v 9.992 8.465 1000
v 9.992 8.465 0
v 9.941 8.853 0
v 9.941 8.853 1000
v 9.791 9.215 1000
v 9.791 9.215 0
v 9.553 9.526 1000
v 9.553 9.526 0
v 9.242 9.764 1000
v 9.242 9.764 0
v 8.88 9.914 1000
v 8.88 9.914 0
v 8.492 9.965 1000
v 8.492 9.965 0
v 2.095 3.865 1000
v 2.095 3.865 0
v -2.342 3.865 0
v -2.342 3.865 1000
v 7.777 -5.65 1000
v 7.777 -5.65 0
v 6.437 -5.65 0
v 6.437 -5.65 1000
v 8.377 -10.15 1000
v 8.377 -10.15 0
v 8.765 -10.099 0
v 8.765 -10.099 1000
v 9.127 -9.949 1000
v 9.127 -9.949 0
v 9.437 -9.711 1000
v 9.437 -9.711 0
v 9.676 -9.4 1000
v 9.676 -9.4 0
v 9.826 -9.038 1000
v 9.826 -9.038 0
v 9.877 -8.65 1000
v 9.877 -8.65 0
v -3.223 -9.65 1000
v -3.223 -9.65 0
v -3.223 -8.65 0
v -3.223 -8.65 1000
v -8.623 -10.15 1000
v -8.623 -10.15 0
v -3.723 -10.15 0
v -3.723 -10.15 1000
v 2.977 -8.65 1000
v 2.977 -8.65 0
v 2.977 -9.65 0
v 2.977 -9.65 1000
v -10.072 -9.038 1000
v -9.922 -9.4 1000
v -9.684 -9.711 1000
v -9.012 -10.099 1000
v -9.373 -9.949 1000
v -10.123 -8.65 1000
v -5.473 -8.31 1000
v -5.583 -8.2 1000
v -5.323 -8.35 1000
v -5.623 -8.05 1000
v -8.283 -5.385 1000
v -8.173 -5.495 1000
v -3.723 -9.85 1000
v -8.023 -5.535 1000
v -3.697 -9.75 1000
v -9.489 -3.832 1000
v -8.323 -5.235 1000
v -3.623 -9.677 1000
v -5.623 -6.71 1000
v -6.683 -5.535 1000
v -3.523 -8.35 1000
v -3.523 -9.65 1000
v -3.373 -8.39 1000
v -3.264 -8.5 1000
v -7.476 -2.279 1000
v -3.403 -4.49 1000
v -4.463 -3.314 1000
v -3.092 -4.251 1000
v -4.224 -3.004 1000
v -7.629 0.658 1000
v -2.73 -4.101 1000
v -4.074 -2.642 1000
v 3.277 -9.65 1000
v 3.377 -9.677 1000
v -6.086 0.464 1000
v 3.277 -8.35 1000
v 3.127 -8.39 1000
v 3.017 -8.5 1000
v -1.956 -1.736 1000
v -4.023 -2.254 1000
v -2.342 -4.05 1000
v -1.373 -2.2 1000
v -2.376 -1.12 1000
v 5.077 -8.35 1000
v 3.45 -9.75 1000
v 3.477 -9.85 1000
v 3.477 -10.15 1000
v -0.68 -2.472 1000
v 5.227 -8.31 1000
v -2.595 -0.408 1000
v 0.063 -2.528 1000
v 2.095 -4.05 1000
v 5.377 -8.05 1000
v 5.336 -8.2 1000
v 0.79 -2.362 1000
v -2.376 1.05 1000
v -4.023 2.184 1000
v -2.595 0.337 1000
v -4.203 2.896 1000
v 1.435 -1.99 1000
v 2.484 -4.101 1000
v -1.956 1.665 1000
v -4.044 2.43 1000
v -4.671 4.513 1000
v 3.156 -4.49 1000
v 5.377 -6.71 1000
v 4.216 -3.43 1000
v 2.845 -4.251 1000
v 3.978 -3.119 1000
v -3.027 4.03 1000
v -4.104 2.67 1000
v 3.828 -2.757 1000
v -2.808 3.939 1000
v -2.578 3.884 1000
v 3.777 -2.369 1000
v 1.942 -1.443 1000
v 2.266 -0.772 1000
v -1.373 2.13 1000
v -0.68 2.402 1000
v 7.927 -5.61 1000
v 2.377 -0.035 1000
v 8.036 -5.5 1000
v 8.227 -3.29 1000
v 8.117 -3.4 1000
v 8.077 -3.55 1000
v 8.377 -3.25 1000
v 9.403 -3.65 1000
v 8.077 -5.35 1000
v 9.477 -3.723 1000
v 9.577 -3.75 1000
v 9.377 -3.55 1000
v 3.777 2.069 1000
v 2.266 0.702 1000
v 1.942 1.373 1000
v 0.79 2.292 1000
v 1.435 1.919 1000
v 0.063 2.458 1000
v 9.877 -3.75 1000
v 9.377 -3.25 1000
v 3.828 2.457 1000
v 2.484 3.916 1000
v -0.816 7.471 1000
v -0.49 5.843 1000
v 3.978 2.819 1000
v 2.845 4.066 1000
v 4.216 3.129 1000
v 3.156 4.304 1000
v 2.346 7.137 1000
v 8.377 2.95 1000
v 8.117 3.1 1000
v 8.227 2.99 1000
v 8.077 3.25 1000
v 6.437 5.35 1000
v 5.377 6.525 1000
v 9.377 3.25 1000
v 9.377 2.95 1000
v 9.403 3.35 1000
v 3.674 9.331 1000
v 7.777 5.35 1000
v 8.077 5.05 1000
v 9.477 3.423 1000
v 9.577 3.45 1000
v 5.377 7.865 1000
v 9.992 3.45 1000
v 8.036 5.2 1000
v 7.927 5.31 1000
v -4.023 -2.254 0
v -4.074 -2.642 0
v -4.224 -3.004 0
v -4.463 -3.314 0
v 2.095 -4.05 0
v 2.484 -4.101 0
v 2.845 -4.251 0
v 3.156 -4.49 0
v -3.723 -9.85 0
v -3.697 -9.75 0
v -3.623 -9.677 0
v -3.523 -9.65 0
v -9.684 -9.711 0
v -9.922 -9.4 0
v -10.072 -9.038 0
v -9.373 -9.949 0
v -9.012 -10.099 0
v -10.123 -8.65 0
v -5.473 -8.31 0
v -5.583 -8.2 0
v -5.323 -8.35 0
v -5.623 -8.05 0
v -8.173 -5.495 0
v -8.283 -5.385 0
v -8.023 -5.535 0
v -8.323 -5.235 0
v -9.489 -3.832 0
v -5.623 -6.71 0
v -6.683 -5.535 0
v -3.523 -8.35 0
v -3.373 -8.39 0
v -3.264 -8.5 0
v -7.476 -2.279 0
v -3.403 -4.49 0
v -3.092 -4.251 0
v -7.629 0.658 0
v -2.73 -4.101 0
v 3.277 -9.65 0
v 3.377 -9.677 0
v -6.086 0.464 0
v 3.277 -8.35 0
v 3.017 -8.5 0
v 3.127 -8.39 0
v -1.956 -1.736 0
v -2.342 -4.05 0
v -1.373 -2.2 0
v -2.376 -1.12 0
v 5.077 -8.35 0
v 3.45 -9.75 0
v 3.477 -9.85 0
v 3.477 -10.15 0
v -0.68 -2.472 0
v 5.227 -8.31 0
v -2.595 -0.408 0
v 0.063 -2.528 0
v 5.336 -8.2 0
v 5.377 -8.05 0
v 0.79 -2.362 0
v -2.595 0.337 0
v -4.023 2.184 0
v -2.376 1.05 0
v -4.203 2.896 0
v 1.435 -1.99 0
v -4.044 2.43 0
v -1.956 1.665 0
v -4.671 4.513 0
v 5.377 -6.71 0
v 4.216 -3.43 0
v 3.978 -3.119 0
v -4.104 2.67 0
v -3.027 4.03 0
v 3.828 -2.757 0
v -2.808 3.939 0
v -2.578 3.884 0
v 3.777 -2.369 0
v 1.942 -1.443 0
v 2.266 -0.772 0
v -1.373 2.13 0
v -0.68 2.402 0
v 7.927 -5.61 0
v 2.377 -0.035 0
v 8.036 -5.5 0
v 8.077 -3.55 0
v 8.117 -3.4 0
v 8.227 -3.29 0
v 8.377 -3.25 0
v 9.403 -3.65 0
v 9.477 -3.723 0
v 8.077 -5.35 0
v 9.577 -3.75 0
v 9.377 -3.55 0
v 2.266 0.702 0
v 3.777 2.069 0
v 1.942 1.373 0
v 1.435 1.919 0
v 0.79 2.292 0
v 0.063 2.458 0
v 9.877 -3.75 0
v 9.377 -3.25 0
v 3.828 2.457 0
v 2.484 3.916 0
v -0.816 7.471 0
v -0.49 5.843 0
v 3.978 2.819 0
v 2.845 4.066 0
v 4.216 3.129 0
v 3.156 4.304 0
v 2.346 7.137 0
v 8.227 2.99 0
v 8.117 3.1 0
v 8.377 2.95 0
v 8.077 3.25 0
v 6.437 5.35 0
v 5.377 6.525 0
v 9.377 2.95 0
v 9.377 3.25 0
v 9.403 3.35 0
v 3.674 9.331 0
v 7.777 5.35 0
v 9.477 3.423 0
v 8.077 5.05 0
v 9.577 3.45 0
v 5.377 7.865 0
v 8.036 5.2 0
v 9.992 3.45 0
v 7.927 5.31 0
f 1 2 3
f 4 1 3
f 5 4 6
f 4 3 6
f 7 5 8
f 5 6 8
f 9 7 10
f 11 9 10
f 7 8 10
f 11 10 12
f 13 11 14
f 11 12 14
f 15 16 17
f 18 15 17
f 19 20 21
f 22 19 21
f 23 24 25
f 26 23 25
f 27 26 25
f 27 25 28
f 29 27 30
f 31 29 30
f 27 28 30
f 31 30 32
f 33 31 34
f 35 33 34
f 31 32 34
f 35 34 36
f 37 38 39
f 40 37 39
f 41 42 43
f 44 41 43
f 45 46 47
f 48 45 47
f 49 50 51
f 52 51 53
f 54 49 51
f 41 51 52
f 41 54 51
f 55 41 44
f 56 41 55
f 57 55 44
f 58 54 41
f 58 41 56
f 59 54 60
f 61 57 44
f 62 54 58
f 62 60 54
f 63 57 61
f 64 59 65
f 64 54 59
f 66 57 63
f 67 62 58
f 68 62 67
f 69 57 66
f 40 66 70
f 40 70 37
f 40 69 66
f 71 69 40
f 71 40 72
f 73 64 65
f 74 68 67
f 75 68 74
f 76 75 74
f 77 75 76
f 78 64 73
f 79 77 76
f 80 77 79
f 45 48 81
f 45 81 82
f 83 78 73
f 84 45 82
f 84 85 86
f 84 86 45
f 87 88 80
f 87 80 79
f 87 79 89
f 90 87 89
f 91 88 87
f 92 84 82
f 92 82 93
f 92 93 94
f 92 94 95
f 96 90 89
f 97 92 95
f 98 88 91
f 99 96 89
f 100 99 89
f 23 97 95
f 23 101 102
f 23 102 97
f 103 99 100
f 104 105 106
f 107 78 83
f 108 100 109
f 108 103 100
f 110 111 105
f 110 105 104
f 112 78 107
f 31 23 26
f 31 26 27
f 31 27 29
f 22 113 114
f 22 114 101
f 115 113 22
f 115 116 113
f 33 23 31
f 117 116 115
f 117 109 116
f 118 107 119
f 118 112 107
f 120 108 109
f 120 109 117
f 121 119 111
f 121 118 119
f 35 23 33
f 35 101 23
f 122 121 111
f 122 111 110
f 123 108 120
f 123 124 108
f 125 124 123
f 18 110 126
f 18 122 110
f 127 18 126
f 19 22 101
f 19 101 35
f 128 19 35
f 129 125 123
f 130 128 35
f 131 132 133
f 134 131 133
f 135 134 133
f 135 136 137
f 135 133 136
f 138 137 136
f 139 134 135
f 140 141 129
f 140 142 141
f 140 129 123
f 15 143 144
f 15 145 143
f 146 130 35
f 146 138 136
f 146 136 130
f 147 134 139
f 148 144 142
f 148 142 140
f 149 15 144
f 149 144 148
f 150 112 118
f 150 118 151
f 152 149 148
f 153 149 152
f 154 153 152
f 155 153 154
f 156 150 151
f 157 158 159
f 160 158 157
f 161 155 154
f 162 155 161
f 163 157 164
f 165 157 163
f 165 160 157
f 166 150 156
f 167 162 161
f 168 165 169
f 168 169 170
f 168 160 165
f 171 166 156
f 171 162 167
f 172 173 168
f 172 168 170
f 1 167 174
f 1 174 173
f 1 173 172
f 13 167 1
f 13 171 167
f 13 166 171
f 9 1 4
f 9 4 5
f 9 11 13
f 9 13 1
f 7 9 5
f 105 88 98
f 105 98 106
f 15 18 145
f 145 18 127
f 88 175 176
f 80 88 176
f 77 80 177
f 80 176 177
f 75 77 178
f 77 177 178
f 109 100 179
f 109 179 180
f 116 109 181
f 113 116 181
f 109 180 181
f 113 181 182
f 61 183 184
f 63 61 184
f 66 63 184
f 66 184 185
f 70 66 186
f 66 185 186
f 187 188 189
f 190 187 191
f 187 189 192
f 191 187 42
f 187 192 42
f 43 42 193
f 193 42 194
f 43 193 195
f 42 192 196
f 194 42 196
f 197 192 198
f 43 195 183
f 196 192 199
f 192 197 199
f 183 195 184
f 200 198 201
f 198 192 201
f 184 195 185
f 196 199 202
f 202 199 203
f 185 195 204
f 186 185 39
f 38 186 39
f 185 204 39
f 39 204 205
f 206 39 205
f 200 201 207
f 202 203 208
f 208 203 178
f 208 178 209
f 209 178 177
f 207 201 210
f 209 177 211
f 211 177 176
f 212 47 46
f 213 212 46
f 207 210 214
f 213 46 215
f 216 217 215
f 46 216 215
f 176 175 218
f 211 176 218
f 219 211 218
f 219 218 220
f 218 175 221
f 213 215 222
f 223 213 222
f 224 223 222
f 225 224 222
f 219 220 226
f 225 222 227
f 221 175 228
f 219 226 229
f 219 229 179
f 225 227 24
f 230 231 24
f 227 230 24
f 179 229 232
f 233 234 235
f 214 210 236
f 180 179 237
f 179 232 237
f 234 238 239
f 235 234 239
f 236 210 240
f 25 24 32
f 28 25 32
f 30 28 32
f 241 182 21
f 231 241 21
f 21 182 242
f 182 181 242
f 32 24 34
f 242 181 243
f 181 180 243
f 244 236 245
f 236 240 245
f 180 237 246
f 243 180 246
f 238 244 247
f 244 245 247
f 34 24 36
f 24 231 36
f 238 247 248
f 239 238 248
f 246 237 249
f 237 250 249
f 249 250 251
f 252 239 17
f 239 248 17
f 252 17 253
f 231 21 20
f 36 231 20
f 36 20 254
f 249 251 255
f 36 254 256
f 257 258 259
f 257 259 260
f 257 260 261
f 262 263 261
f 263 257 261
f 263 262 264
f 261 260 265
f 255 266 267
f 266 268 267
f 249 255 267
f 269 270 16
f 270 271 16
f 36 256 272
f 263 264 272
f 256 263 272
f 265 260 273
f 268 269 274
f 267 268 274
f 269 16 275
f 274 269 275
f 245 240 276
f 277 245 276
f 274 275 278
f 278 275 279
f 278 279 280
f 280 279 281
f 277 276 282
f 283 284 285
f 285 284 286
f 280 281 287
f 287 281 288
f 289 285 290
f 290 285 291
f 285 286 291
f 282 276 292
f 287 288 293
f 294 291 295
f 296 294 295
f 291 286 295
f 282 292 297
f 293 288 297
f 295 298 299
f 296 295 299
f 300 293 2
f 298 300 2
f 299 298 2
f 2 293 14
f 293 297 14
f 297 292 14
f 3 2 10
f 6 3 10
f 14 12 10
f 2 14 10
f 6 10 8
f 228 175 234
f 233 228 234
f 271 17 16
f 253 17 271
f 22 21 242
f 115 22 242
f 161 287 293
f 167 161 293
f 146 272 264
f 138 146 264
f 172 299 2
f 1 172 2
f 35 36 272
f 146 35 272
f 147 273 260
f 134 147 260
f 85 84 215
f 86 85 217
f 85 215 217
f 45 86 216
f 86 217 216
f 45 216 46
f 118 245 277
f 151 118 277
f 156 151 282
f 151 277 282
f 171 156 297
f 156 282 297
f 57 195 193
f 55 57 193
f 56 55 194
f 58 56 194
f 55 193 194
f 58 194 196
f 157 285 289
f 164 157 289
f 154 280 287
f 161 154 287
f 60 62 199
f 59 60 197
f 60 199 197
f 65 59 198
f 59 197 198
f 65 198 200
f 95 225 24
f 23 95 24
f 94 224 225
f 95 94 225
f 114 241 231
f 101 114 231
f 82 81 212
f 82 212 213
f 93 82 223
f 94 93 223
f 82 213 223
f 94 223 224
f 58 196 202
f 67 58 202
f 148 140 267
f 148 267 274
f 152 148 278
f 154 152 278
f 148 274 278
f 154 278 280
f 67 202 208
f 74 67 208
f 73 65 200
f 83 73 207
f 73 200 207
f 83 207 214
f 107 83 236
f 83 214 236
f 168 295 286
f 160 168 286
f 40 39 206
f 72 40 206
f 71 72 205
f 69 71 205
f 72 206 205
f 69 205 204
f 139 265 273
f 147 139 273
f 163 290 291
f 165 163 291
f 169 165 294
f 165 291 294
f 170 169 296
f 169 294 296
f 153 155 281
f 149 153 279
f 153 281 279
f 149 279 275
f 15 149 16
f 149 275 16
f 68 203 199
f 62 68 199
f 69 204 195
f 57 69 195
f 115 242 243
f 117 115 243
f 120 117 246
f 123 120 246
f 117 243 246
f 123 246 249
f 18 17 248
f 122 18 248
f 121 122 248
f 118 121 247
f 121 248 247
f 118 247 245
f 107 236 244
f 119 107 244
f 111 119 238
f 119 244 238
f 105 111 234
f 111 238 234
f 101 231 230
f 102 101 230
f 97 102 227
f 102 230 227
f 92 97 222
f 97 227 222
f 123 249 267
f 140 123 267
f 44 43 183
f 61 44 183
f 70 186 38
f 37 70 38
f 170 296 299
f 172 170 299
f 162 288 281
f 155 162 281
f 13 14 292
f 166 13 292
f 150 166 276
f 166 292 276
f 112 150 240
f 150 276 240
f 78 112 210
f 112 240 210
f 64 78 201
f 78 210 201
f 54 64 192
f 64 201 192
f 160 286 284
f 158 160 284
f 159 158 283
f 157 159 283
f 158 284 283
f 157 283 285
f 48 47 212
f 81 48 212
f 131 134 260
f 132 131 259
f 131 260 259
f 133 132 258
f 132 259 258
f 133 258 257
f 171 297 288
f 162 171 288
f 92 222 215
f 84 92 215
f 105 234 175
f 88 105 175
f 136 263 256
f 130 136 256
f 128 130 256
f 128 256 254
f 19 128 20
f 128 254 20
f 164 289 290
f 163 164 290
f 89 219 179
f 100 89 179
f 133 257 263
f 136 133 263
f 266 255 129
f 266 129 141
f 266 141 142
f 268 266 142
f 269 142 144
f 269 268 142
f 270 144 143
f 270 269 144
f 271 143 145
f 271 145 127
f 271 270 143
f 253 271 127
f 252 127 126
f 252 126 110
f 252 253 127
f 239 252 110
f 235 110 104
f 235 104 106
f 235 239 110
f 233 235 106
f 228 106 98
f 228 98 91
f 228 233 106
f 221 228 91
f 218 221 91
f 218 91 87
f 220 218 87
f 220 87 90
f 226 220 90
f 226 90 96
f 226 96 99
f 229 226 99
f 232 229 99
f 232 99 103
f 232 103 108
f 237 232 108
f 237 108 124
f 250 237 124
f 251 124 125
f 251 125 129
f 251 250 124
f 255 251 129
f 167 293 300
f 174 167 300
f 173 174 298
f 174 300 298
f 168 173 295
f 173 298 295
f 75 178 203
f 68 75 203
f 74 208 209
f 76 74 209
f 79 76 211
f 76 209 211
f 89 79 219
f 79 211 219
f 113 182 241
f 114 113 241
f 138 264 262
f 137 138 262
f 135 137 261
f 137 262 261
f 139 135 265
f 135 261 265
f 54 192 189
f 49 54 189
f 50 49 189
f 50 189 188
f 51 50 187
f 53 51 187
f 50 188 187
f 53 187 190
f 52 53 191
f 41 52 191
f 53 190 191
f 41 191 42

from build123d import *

# Parameters (mm, degrees)
SKETCH_1_R      = 2.5
EXTRUDE_1_DEPTH = 1000


with BuildPart() as part:
    # 草图1 → 凸台-拉伸1 (new body)
    with BuildSketch(Plane.XY):
        with BuildLine():
            Line((4.215995631, 3.129161171), (6.436655803, 5.349821343))
            Line((6.436655803, 5.349821343), (7.776655803, 5.349821343))
            ThreePointArc((7.776655803, 5.349821343), (7.988787838, 5.261953377), (8.076655803, 5.049821343))
            Line((8.076655803, 5.049821343), (8.076655803, 3.249821343))
            ThreePointArc((8.076655803, 3.249821343), (8.164523769, 3.037689308), (8.376655803, 2.949821343))
            Line((8.376655803, 2.949821343), (9.376655803, 2.949821343))
            Line((9.376655803, 2.949821343), (9.376655803, 3.249821343))
            ThreePointArc((9.376655803, 3.249821343), (9.435234447, 3.391242699), (9.576655803, 3.449821343))
            Line((9.576655803, 3.449821343), (9.99208048, 3.449821343))
            Line((9.99208048, 3.449821343), (9.99208048, 8.46524602))
            ThreePointArc((9.99208048, 8.46524602), (9.552740652, 9.525906191), (8.49208048, 9.96524602))
            ThreePointArc((8.49208048, 9.96524602), (-4.671012544, 4.512914366), (-10.123344197, -8.650178657))
            ThreePointArc((-10.123344197, -8.650178657), (-9.684004369, -9.710838829), (-8.623344197, -10.150178657))
            Line((-8.623344197, -10.150178657), (-3.723344197, -10.150178657))
            Line((-3.723344197, -10.150178657), (-3.723344197, -9.850178657))
            ThreePointArc((-3.723344197, -9.850178657), (-3.664765553, -9.708757301), (-3.523344197, -9.650178657))
            Line((-3.523344197, -9.650178657), (-3.223344197, -9.650178657))
            Line((-3.223344197, -9.650178657), (-3.223344197, -8.650178657))
            ThreePointArc((-3.223344197, -8.650178657), (-3.311212162, -8.438046623), (-3.523344197, -8.350178657))
            Line((-3.523344197, -8.350178657), (-5.323344197, -8.350178657))
            ThreePointArc((-5.323344197, -8.350178657), (-5.535476231, -8.262310692), (-5.623344197, -8.050178657))
            Line((-5.623344197, -8.050178657), (-5.623344197, -6.710178657))
            Line((-5.623344197, -6.710178657), (-3.402684025, -4.489518485))
            ThreePointArc((-3.402684025, -4.489518485), (-2.916049002, -4.164359358), (-2.342023853, -4.050178657))
            Line((-2.342023853, -4.050178657), (2.09533546, -4.050178657))
            ThreePointArc((2.09533546, -4.050178657), (2.669360608, -4.164359358), (3.155995631, -4.489518485))
            Line((3.155995631, -4.489518485), (5.376655803, -6.710178657))
            Line((5.376655803, -6.710178657), (5.376655803, -8.050178657))
            ThreePointArc((5.376655803, -8.050178657), (5.288787838, -8.262310692), (5.076655803, -8.350178657))
            Line((5.076655803, -8.350178657), (3.276655803, -8.350178657))
            ThreePointArc((3.276655803, -8.350178657), (3.064523769, -8.438046623), (2.976655803, -8.650178657))
            Line((2.976655803, -8.650178657), (2.976655803, -9.650178657))
            Line((2.976655803, -9.650178657), (3.276655803, -9.650178657))
            ThreePointArc((3.276655803, -9.650178657), (3.418077159, -9.708757301), (3.476655803, -9.850178657))
            Line((3.476655803, -9.850178657), (3.476655803, -10.150178657))
            Line((3.476655803, -10.150178657), (8.376655803, -10.150178657))
            ThreePointArc((8.376655803, -10.150178657), (9.437315975, -9.710838829), (9.876655803, -8.650178657))
            Line((9.876655803, -8.650178657), (9.876655803, -3.750178657))
            Line((9.876655803, -3.750178657), (9.576655803, -3.750178657))
            ThreePointArc((9.576655803, -3.750178657), (9.435234447, -3.691600013), (9.376655803, -3.550178657))
            Line((9.376655803, -3.550178657), (9.376655803, -3.250178657))
            Line((9.376655803, -3.250178657), (8.376655803, -3.250178657))
            ThreePointArc((8.376655803, -3.250178657), (8.164523769, -3.338046623), (8.076655803, -3.550178657))
            Line((8.076655803, -3.550178657), (8.076655803, -5.350178657))
            ThreePointArc((8.076655803, -5.350178657), (7.988787838, -5.562310692), (7.776655803, -5.650178657))
            Line((7.776655803, -5.650178657), (6.436655803, -5.650178657))
            Line((6.436655803, -5.650178657), (4.215995631, -3.429518485))
            ThreePointArc((4.215995631, -3.429518485), (3.890836504, -2.942883462), (3.776655803, -2.368858314))
            Line((3.776655803, -2.368858314), (3.776655803, 2.068500999))
            ThreePointArc((3.776655803, 2.068500999), (3.890836504, 2.642526148), (4.215995631, 3.129161171))
        make_face()
        with Locations((-0.123344197, -0.035109627)):
            Circle(SKETCH_1_R, mode=Mode.SUBTRACT)
        with BuildLine():
            Line((5.376655803, 7.864890373), (5.376655803, 6.524890373))
            Line((5.376655803, 6.524890373), (3.155995631, 4.304230202))
            ThreePointArc((3.155995631, 4.304230202), (2.669360608, 3.979071075), (2.09533546, 3.864890373))
            Line((2.09533546, 3.864890373), (-2.342023853, 3.864890373))
            ThreePointArc((-2.342023853, 3.864890373), (-2.69419221, 3.906817176), (-3.026673509, 4.030253775))
            ThreePointArc((-3.026673509, 4.030253775), (0.896523465, 6.557813899), (5.376655803, 7.864890373))
        make_face(mode=Mode.SUBTRACT)
        with BuildLine():
            Line((-4.023344197, 2.18357003), (-4.023344197, -2.253789283))
            ThreePointArc((-4.023344197, -2.253789283), (-4.137524898, -2.827814432), (-4.462684025, -3.314449455))
            Line((-4.462684025, -3.314449455), (-6.683344197, -5.535109627))
            Line((-6.683344197, -5.535109627), (-8.023344197, -5.535109627))
            ThreePointArc((-8.023344197, -5.535109627), (-8.235476231, -5.447241661), (-8.323344197, -5.235109627))
            ThreePointArc((-8.323344197, -5.235109627), (-6.845791054, -0.874365796), (-4.203440462, 2.89620888))
            ThreePointArc((-4.203440462, 2.89620888), (-4.069065062, 2.551091728), (-4.023344197, 2.18357003))
        make_face(mode=Mode.SUBTRACT)
    extrude(amount=EXTRUDE_1_DEPTH)


solid = part.part
